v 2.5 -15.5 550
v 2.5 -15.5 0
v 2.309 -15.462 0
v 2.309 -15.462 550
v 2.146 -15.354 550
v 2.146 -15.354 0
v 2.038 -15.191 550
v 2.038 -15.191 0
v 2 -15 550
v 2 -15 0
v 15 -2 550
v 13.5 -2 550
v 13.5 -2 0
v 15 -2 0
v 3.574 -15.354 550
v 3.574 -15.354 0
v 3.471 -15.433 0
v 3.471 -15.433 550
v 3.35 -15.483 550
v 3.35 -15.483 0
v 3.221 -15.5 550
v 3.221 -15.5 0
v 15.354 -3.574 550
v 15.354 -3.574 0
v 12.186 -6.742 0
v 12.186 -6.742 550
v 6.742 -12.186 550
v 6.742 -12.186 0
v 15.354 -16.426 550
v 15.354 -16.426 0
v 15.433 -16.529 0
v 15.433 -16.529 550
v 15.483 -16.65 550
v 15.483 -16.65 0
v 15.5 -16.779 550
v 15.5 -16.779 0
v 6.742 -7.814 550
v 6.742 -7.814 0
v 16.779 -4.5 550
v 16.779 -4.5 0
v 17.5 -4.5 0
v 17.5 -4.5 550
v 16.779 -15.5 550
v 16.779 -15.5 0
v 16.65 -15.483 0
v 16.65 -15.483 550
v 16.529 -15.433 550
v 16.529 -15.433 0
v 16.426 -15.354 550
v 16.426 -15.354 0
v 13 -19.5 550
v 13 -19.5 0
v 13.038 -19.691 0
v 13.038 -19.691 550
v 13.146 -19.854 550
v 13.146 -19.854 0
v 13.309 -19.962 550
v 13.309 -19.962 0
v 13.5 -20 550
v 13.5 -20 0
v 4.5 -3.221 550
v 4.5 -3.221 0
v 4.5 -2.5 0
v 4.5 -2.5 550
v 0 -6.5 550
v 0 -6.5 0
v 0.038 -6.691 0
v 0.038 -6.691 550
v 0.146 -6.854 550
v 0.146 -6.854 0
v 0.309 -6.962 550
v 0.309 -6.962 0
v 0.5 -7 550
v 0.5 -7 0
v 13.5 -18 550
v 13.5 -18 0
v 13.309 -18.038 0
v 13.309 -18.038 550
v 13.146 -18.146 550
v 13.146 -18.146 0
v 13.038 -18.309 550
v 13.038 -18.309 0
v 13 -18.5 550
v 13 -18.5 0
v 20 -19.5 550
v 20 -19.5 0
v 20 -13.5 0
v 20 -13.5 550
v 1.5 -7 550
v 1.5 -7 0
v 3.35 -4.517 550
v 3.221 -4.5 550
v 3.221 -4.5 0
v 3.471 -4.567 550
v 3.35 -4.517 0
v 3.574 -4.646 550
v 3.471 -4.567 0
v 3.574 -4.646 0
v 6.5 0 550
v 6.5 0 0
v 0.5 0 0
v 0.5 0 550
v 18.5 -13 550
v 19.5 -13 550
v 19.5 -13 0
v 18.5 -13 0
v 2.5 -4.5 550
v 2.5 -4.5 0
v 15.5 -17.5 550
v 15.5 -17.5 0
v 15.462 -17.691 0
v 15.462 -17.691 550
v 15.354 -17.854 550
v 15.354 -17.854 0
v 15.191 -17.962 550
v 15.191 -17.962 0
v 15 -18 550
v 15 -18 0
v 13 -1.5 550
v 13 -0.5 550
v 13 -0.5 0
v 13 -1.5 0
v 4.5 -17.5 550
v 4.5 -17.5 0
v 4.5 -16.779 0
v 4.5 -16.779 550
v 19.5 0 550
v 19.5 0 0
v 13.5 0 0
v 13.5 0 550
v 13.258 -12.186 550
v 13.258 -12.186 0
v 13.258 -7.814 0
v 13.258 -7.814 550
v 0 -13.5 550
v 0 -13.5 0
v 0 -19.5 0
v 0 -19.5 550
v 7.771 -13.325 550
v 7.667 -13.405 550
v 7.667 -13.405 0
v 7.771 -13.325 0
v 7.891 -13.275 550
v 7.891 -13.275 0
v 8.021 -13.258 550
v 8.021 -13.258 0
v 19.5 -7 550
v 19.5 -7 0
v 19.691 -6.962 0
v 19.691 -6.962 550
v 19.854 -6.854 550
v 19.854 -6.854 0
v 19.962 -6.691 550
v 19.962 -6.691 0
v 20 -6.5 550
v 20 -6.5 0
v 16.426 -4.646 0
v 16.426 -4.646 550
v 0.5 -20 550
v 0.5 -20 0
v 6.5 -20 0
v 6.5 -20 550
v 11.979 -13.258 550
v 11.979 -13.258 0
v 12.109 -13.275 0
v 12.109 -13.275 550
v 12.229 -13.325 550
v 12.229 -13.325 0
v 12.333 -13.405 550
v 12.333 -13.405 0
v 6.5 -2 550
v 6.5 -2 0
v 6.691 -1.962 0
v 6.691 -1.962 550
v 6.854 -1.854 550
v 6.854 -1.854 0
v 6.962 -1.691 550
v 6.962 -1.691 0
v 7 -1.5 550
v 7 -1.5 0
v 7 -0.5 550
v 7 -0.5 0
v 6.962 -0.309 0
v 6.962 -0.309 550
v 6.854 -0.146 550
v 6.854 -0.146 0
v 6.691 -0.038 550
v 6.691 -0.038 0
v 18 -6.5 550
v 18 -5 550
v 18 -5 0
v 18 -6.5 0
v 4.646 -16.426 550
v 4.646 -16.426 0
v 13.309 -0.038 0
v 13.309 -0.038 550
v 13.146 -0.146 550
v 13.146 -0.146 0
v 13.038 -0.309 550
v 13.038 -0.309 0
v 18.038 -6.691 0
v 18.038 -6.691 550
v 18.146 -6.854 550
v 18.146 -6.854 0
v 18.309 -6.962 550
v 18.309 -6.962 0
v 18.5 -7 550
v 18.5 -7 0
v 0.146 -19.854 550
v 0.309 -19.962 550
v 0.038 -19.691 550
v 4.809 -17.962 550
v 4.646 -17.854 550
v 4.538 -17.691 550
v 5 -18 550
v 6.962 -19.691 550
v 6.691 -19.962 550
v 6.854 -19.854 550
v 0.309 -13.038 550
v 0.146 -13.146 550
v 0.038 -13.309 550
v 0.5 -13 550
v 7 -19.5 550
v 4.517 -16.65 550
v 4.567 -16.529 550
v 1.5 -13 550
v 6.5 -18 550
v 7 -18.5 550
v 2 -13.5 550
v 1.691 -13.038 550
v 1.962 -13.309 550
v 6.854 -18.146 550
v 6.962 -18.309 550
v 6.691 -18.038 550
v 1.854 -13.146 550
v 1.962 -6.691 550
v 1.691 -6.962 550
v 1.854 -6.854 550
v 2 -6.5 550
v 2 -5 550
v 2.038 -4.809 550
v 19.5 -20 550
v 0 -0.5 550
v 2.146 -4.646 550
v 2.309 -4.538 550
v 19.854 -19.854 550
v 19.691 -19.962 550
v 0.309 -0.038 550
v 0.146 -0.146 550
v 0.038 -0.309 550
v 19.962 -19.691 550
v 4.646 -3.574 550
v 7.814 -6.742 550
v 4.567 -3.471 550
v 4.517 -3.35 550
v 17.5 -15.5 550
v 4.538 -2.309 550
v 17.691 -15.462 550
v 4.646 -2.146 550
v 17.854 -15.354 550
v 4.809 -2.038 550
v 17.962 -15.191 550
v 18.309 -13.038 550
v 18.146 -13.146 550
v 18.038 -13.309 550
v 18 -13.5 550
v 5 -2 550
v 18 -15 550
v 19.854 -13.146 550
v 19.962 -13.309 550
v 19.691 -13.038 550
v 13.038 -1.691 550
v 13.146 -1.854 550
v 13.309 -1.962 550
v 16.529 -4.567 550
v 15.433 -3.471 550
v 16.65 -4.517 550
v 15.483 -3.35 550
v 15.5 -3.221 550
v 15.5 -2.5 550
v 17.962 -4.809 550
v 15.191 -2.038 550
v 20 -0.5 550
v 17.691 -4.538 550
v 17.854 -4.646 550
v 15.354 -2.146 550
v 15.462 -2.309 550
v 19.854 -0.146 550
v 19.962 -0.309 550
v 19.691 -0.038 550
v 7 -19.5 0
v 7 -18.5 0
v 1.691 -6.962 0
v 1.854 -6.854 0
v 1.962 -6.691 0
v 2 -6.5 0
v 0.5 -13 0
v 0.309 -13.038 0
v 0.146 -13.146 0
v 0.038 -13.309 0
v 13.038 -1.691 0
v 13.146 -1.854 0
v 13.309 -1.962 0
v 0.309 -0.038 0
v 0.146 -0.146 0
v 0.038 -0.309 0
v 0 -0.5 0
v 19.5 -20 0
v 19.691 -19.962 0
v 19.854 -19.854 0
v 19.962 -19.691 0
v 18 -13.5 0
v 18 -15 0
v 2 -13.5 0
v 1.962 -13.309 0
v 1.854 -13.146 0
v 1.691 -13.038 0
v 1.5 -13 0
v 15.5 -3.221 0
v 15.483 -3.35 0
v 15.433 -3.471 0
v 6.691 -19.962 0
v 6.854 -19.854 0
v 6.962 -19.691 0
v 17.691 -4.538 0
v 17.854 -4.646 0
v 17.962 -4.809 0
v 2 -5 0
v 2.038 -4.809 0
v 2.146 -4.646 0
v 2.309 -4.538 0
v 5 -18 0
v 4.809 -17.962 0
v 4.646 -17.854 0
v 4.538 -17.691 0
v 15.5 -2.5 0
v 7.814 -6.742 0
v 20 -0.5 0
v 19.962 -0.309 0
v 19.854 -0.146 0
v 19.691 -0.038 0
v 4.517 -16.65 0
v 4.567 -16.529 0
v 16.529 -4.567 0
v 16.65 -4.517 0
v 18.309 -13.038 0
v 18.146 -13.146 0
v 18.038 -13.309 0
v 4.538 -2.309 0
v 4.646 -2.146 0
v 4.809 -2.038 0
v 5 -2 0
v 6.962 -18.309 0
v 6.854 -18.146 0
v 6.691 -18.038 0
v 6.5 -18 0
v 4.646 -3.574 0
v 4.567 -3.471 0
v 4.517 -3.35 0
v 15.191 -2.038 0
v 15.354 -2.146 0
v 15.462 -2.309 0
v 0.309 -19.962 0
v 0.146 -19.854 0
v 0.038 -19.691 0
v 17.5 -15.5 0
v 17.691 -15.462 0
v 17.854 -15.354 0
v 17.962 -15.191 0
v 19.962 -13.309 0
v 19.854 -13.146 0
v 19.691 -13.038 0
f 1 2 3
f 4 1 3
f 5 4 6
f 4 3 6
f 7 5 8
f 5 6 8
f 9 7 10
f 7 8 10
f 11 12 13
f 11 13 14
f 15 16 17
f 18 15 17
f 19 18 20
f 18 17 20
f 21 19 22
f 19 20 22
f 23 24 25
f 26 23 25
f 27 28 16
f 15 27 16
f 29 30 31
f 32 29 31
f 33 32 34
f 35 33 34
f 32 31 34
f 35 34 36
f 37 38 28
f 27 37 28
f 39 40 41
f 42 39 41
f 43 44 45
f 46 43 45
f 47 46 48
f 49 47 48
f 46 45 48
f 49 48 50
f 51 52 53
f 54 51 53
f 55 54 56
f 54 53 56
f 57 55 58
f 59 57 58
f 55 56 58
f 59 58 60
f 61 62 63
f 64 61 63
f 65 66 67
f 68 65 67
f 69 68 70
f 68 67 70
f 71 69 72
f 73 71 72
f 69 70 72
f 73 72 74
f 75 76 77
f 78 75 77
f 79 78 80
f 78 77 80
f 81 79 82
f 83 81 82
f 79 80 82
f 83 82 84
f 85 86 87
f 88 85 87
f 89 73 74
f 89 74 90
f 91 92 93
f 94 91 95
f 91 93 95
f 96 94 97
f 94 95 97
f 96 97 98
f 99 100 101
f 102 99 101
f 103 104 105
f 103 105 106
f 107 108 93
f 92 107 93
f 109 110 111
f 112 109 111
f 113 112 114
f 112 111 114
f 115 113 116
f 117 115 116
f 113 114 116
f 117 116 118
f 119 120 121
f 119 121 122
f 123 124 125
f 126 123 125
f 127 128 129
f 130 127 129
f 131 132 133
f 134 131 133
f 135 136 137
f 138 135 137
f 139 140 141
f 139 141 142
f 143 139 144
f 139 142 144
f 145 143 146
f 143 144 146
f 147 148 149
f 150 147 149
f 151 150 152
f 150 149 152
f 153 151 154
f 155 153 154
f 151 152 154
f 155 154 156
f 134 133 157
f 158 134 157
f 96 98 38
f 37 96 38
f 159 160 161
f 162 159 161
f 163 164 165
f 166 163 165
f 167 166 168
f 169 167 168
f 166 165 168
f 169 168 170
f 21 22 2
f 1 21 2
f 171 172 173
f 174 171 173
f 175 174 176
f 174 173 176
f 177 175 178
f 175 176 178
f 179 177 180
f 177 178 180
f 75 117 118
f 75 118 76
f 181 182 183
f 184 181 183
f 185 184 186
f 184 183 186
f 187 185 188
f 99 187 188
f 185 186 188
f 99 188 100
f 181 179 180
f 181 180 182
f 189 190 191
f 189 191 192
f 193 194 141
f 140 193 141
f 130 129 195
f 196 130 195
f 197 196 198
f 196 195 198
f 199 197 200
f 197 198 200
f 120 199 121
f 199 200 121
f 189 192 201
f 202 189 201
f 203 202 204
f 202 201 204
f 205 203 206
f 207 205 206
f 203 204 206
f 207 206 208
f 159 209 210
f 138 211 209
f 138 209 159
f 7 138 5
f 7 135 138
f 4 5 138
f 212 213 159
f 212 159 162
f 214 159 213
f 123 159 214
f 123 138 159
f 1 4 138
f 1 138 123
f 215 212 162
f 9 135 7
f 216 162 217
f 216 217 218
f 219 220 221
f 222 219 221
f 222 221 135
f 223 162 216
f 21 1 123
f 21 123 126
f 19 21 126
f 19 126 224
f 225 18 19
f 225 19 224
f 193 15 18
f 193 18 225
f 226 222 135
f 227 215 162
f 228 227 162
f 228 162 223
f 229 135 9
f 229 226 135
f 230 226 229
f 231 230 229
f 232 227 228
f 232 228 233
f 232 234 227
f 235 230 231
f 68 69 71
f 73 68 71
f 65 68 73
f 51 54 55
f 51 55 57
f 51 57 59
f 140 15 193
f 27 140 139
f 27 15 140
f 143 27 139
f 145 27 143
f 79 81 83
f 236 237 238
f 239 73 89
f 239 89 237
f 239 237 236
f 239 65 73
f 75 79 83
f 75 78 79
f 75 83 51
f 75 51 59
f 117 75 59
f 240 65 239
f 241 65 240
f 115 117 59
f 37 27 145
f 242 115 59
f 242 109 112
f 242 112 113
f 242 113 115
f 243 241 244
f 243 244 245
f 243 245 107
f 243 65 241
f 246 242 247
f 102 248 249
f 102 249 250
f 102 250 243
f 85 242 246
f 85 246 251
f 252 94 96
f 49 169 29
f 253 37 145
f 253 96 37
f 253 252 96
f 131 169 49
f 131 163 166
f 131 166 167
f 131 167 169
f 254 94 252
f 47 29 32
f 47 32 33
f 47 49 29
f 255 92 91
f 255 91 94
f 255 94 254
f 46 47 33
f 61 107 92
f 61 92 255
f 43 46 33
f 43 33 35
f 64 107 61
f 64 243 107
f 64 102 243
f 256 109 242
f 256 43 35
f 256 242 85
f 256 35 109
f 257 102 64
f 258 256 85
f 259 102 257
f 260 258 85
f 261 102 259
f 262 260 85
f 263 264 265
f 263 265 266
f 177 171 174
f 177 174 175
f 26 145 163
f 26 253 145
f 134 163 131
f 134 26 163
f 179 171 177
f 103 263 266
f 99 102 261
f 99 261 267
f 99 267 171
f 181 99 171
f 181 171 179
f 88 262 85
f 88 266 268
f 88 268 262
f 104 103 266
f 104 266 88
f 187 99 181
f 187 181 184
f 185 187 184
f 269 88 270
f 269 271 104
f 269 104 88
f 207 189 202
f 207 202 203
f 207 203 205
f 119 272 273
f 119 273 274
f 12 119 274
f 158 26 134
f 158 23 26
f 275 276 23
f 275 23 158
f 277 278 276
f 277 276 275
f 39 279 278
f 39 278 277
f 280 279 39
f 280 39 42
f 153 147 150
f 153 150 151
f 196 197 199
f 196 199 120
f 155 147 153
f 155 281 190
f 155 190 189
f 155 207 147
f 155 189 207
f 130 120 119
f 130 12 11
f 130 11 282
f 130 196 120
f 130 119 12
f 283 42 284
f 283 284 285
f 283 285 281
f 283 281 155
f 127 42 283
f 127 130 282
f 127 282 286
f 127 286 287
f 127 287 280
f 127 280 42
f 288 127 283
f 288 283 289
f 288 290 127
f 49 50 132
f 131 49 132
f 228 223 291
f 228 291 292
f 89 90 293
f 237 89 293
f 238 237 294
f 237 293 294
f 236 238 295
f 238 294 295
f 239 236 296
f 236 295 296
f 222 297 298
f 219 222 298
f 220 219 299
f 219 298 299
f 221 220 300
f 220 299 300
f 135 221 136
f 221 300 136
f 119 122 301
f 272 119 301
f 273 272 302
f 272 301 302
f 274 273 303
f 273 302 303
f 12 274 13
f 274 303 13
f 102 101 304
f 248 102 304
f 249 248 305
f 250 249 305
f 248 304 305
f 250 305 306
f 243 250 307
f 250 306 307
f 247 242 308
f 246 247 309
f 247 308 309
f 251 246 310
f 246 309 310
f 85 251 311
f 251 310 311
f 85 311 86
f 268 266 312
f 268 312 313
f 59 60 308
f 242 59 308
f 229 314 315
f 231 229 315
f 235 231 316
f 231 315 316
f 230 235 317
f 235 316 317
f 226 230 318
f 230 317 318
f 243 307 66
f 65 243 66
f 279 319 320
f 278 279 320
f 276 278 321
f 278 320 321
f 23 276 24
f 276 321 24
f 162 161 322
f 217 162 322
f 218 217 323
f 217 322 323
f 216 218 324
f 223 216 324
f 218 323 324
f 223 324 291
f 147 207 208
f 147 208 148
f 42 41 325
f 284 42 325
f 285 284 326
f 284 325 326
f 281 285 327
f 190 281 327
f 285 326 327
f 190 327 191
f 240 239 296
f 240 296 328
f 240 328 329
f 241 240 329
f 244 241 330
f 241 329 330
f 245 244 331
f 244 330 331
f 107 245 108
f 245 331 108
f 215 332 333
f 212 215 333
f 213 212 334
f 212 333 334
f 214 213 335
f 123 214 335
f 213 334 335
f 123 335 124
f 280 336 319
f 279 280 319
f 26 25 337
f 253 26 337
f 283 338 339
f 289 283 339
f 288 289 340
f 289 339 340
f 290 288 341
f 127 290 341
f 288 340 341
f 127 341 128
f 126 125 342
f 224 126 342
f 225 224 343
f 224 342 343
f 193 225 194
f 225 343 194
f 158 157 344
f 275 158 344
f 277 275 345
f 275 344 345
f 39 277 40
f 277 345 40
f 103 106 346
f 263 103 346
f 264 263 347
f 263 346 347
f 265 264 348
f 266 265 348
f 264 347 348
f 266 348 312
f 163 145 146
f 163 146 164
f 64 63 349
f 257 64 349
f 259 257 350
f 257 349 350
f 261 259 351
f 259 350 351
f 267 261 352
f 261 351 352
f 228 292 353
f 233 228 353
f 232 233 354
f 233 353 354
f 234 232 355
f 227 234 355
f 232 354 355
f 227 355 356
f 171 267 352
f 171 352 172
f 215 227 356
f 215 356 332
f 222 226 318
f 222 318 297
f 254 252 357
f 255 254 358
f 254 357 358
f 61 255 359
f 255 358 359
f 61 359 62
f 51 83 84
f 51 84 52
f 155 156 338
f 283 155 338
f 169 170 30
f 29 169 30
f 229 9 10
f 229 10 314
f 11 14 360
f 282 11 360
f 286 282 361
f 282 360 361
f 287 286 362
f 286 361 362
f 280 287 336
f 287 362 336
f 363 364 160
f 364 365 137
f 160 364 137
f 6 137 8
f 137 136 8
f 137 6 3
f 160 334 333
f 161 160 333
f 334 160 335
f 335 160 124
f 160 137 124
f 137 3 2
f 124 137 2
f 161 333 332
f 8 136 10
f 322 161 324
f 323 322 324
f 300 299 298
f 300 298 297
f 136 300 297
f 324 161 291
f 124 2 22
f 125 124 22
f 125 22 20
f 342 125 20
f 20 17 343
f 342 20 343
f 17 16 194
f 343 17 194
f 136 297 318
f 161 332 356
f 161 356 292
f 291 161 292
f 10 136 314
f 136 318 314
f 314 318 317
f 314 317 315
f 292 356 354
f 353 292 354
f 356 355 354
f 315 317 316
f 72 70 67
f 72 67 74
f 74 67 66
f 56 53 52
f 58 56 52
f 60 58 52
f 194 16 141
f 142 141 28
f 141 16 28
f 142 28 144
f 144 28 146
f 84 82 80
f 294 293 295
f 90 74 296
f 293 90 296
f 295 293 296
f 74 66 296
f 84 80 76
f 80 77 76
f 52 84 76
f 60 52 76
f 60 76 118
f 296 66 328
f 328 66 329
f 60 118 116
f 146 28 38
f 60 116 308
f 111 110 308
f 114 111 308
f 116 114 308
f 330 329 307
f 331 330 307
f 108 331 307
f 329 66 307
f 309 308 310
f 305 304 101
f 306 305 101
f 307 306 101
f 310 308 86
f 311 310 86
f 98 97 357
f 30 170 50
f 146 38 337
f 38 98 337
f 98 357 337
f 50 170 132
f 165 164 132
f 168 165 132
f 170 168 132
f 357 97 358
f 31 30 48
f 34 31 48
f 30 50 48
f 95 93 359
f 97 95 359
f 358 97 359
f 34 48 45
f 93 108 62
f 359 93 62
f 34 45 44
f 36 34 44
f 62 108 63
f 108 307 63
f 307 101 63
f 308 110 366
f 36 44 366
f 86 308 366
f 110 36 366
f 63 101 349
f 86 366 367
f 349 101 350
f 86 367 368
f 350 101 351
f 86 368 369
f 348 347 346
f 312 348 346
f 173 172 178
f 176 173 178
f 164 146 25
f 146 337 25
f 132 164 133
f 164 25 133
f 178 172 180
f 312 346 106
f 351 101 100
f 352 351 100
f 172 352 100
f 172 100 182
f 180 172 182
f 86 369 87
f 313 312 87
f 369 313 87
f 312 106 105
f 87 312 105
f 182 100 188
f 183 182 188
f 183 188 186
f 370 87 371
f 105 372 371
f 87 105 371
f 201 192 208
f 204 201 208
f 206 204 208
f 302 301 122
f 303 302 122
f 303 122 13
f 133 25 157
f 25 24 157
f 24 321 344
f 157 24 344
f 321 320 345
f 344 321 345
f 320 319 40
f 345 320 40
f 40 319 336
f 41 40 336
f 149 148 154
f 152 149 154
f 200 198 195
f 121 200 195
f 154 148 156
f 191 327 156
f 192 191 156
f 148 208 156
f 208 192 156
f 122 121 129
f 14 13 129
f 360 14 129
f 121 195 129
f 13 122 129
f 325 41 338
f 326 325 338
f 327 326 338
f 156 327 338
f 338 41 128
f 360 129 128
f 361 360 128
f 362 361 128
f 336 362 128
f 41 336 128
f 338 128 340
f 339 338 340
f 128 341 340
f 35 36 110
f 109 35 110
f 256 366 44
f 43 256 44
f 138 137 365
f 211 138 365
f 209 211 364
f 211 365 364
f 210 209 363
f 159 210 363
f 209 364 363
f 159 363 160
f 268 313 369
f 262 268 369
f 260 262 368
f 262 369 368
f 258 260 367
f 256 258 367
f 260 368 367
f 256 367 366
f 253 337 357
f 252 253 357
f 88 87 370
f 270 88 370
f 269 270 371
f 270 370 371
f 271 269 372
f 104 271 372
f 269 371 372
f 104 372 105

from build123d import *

# Parameters (mm, degrees)
EXTRUDE_1_DEPTH = 550


with BuildPart() as part:
    # 草图1 → 凸台-拉伸1 (new body)
    with BuildSketch(Plane.XY):
        with BuildLine():
            Line((6.5, 0), (0.5, 0))
            ThreePointArc((0.5, 0), (0.146446609, -0.146446609), (0, -0.5))
            Line((0, -0.5), (0, -6.5))
            ThreePointArc((0, -6.5), (0.146446609, -6.853553391), (0.5, -7))
            Line((0.5, -7), (1.5, -7))
            ThreePointArc((1.5, -7), (1.853553391, -6.853553391), (2, -6.5))
            Line((2, -6.5), (2, -5))
            ThreePointArc((2, -5), (2.146446609, -4.646446609), (2.5, -4.5))
            Line((2.5, -4.5), (3.220918534, -4.5))
            ThreePointArc((3.220918534, -4.5), (3.412260251, -4.538060234), (3.574471925, -4.646446609))
            Line((3.574471925, -4.646446609), (6.741642787, -7.813617472))
            Line((6.741642787, -7.813617472), (6.741642787, -12.186382528))
            Line((6.741642787, -12.186382528), (3.574471925, -15.353553391))
            ThreePointArc((3.574471925, -15.353553391), (3.412260251, -15.461939766), (3.220918534, -15.5))
            Line((3.220918534, -15.5), (2.5, -15.5))
            ThreePointArc((2.5, -15.5), (2.146446609, -15.353553391), (2, -15))
            Line((2, -15), (2, -13.5))
            ThreePointArc((2, -13.5), (1.853553391, -13.146446609), (1.5, -13))
            Line((1.5, -13), (0.5, -13))
            ThreePointArc((0.5, -13), (0.146446609, -13.146446609), (0, -13.5))
            Line((0, -13.5), (0, -19.5))
            ThreePointArc((0, -19.5), (0.146446609, -19.853553391), (0.5, -20))
            Line((0.5, -20), (6.5, -20))
            ThreePointArc((6.5, -20), (6.853553391, -19.853553391), (7, -19.5))
            Line((7, -19.5), (7, -18.5))
            ThreePointArc((7, -18.5), (6.853553391, -18.146446609), (6.5, -18))
            Line((6.5, -18), (5, -18))
            ThreePointArc((5, -18), (4.646446609, -17.853553391), (4.5, -17.5))
            Line((4.5, -17.5), (4.5, -16.779081466))
            ThreePointArc((4.5, -16.779081466), (4.538060234, -16.587739749), (4.646446609, -16.425528075))
            Line((4.646446609, -16.425528075), (7.667170862, -13.404803822))
            ThreePointArc((7.667170862, -13.404803822), (7.829382537, -13.296417446), (8.020724253, -13.258357213))
            Line((8.020724253, -13.258357213), (11.979275747, -13.258357213))
            ThreePointArc((11.979275747, -13.258357213), (12.170617463, -13.296417446), (12.332829138, -13.404803822))
            Line((12.332829138, -13.404803822), (15.353553391, -16.425528075))
            ThreePointArc((15.353553391, -16.425528075), (15.461939766, -16.587739749), (15.5, -16.779081466))
            Line((15.5, -16.779081466), (15.5, -17.5))
            ThreePointArc((15.5, -17.5), (15.353553391, -17.853553391), (15, -18))
            Line((15, -18), (13.5, -18))
            ThreePointArc((13.5, -18), (13.146446609, -18.146446609), (13, -18.5))
            Line((13, -18.5), (13, -19.5))
            ThreePointArc((13, -19.5), (13.146446609, -19.853553391), (13.5, -20))
            Line((13.5, -20), (19.5, -20))
            ThreePointArc((19.5, -20), (19.853553391, -19.853553391), (20, -19.5))
            Line((20, -19.5), (20, -13.5))
            ThreePointArc((20, -13.5), (19.853553391, -13.146446609), (19.5, -13))
            Line((19.5, -13), (18.5, -13))
            ThreePointArc((18.5, -13), (18.146446609, -13.146446609), (18, -13.5))
            Line((18, -13.5), (18, -15))
            ThreePointArc((18, -15), (17.853553391, -15.353553391), (17.5, -15.5))
            Line((17.5, -15.5), (16.779081466, -15.5))
            ThreePointArc((16.779081466, -15.5), (16.587739749, -15.461939766), (16.425528075, -15.353553391))
            Line((16.425528075, -15.353553391), (13.258357213, -12.186382528))
            Line((13.258357213, -12.186382528), (13.258357213, -7.813617472))
            Line((13.258357213, -7.813617472), (16.425528075, -4.646446609))
            ThreePointArc((16.425528075, -4.646446609), (16.587739749, -4.538060234), (16.779081466, -4.5))
            Line((16.779081466, -4.5), (17.5, -4.5))
            ThreePointArc((17.5, -4.5), (17.853553391, -4.646446609), (18, -5))
            Line((18, -5), (18, -6.5))
            ThreePointArc((18, -6.5), (18.146446609, -6.853553391), (18.5, -7))
            Line((18.5, -7), (19.5, -7))
            ThreePointArc((19.5, -7), (19.853553391, -6.853553391), (20, -6.5))
            Line((20, -6.5), (20, -0.5))
            ThreePointArc((20, -0.5), (19.853553391, -0.146446609), (19.5, 0))
            Line((19.5, 0), (13.5, 0))
            ThreePointArc((13.5, 0), (13.146446609, -0.146446609), (13, -0.5))
            Line((13, -0.5), (13, -1.5))
            ThreePointArc((13, -1.5), (13.146446609, -1.853553391), (13.5, -2))
            Line((13.5, -2), (15, -2))
            ThreePointArc((15, -2), (15.353553391, -2.146446609), (15.5, -2.5))
            Line((15.5, -2.5), (15.5, -3.220918534))
            ThreePointArc((15.5, -3.220918534), (15.461939766, -3.412260251), (15.353553391, -3.574471925))
            Line((15.353553391, -3.574471925), (12.186382528, -6.741642787))
            Line((12.186382528, -6.741642787), (7.813617472, -6.741642787))
            Line((7.813617472, -6.741642787), (4.646446609, -3.574471925))
            ThreePointArc((4.646446609, -3.574471925), (4.538060234, -3.412260251), (4.5, -3.220918534))
            Line((4.5, -3.220918534), (4.5, -2.5))
            ThreePointArc((4.5, -2.5), (4.646446609, -2.146446609), (5, -2))
            Line((5, -2), (6.5, -2))
            ThreePointArc((6.5, -2), (6.853553391, -1.853553391), (7, -1.5))
            Line((7, -1.5), (7, -0.5))
            ThreePointArc((7, -0.5), (6.853553391, -0.146446609), (6.5, 0))
        make_face()
    extrude(amount=EXTRUDE_1_DEPTH)


solid = part.part
